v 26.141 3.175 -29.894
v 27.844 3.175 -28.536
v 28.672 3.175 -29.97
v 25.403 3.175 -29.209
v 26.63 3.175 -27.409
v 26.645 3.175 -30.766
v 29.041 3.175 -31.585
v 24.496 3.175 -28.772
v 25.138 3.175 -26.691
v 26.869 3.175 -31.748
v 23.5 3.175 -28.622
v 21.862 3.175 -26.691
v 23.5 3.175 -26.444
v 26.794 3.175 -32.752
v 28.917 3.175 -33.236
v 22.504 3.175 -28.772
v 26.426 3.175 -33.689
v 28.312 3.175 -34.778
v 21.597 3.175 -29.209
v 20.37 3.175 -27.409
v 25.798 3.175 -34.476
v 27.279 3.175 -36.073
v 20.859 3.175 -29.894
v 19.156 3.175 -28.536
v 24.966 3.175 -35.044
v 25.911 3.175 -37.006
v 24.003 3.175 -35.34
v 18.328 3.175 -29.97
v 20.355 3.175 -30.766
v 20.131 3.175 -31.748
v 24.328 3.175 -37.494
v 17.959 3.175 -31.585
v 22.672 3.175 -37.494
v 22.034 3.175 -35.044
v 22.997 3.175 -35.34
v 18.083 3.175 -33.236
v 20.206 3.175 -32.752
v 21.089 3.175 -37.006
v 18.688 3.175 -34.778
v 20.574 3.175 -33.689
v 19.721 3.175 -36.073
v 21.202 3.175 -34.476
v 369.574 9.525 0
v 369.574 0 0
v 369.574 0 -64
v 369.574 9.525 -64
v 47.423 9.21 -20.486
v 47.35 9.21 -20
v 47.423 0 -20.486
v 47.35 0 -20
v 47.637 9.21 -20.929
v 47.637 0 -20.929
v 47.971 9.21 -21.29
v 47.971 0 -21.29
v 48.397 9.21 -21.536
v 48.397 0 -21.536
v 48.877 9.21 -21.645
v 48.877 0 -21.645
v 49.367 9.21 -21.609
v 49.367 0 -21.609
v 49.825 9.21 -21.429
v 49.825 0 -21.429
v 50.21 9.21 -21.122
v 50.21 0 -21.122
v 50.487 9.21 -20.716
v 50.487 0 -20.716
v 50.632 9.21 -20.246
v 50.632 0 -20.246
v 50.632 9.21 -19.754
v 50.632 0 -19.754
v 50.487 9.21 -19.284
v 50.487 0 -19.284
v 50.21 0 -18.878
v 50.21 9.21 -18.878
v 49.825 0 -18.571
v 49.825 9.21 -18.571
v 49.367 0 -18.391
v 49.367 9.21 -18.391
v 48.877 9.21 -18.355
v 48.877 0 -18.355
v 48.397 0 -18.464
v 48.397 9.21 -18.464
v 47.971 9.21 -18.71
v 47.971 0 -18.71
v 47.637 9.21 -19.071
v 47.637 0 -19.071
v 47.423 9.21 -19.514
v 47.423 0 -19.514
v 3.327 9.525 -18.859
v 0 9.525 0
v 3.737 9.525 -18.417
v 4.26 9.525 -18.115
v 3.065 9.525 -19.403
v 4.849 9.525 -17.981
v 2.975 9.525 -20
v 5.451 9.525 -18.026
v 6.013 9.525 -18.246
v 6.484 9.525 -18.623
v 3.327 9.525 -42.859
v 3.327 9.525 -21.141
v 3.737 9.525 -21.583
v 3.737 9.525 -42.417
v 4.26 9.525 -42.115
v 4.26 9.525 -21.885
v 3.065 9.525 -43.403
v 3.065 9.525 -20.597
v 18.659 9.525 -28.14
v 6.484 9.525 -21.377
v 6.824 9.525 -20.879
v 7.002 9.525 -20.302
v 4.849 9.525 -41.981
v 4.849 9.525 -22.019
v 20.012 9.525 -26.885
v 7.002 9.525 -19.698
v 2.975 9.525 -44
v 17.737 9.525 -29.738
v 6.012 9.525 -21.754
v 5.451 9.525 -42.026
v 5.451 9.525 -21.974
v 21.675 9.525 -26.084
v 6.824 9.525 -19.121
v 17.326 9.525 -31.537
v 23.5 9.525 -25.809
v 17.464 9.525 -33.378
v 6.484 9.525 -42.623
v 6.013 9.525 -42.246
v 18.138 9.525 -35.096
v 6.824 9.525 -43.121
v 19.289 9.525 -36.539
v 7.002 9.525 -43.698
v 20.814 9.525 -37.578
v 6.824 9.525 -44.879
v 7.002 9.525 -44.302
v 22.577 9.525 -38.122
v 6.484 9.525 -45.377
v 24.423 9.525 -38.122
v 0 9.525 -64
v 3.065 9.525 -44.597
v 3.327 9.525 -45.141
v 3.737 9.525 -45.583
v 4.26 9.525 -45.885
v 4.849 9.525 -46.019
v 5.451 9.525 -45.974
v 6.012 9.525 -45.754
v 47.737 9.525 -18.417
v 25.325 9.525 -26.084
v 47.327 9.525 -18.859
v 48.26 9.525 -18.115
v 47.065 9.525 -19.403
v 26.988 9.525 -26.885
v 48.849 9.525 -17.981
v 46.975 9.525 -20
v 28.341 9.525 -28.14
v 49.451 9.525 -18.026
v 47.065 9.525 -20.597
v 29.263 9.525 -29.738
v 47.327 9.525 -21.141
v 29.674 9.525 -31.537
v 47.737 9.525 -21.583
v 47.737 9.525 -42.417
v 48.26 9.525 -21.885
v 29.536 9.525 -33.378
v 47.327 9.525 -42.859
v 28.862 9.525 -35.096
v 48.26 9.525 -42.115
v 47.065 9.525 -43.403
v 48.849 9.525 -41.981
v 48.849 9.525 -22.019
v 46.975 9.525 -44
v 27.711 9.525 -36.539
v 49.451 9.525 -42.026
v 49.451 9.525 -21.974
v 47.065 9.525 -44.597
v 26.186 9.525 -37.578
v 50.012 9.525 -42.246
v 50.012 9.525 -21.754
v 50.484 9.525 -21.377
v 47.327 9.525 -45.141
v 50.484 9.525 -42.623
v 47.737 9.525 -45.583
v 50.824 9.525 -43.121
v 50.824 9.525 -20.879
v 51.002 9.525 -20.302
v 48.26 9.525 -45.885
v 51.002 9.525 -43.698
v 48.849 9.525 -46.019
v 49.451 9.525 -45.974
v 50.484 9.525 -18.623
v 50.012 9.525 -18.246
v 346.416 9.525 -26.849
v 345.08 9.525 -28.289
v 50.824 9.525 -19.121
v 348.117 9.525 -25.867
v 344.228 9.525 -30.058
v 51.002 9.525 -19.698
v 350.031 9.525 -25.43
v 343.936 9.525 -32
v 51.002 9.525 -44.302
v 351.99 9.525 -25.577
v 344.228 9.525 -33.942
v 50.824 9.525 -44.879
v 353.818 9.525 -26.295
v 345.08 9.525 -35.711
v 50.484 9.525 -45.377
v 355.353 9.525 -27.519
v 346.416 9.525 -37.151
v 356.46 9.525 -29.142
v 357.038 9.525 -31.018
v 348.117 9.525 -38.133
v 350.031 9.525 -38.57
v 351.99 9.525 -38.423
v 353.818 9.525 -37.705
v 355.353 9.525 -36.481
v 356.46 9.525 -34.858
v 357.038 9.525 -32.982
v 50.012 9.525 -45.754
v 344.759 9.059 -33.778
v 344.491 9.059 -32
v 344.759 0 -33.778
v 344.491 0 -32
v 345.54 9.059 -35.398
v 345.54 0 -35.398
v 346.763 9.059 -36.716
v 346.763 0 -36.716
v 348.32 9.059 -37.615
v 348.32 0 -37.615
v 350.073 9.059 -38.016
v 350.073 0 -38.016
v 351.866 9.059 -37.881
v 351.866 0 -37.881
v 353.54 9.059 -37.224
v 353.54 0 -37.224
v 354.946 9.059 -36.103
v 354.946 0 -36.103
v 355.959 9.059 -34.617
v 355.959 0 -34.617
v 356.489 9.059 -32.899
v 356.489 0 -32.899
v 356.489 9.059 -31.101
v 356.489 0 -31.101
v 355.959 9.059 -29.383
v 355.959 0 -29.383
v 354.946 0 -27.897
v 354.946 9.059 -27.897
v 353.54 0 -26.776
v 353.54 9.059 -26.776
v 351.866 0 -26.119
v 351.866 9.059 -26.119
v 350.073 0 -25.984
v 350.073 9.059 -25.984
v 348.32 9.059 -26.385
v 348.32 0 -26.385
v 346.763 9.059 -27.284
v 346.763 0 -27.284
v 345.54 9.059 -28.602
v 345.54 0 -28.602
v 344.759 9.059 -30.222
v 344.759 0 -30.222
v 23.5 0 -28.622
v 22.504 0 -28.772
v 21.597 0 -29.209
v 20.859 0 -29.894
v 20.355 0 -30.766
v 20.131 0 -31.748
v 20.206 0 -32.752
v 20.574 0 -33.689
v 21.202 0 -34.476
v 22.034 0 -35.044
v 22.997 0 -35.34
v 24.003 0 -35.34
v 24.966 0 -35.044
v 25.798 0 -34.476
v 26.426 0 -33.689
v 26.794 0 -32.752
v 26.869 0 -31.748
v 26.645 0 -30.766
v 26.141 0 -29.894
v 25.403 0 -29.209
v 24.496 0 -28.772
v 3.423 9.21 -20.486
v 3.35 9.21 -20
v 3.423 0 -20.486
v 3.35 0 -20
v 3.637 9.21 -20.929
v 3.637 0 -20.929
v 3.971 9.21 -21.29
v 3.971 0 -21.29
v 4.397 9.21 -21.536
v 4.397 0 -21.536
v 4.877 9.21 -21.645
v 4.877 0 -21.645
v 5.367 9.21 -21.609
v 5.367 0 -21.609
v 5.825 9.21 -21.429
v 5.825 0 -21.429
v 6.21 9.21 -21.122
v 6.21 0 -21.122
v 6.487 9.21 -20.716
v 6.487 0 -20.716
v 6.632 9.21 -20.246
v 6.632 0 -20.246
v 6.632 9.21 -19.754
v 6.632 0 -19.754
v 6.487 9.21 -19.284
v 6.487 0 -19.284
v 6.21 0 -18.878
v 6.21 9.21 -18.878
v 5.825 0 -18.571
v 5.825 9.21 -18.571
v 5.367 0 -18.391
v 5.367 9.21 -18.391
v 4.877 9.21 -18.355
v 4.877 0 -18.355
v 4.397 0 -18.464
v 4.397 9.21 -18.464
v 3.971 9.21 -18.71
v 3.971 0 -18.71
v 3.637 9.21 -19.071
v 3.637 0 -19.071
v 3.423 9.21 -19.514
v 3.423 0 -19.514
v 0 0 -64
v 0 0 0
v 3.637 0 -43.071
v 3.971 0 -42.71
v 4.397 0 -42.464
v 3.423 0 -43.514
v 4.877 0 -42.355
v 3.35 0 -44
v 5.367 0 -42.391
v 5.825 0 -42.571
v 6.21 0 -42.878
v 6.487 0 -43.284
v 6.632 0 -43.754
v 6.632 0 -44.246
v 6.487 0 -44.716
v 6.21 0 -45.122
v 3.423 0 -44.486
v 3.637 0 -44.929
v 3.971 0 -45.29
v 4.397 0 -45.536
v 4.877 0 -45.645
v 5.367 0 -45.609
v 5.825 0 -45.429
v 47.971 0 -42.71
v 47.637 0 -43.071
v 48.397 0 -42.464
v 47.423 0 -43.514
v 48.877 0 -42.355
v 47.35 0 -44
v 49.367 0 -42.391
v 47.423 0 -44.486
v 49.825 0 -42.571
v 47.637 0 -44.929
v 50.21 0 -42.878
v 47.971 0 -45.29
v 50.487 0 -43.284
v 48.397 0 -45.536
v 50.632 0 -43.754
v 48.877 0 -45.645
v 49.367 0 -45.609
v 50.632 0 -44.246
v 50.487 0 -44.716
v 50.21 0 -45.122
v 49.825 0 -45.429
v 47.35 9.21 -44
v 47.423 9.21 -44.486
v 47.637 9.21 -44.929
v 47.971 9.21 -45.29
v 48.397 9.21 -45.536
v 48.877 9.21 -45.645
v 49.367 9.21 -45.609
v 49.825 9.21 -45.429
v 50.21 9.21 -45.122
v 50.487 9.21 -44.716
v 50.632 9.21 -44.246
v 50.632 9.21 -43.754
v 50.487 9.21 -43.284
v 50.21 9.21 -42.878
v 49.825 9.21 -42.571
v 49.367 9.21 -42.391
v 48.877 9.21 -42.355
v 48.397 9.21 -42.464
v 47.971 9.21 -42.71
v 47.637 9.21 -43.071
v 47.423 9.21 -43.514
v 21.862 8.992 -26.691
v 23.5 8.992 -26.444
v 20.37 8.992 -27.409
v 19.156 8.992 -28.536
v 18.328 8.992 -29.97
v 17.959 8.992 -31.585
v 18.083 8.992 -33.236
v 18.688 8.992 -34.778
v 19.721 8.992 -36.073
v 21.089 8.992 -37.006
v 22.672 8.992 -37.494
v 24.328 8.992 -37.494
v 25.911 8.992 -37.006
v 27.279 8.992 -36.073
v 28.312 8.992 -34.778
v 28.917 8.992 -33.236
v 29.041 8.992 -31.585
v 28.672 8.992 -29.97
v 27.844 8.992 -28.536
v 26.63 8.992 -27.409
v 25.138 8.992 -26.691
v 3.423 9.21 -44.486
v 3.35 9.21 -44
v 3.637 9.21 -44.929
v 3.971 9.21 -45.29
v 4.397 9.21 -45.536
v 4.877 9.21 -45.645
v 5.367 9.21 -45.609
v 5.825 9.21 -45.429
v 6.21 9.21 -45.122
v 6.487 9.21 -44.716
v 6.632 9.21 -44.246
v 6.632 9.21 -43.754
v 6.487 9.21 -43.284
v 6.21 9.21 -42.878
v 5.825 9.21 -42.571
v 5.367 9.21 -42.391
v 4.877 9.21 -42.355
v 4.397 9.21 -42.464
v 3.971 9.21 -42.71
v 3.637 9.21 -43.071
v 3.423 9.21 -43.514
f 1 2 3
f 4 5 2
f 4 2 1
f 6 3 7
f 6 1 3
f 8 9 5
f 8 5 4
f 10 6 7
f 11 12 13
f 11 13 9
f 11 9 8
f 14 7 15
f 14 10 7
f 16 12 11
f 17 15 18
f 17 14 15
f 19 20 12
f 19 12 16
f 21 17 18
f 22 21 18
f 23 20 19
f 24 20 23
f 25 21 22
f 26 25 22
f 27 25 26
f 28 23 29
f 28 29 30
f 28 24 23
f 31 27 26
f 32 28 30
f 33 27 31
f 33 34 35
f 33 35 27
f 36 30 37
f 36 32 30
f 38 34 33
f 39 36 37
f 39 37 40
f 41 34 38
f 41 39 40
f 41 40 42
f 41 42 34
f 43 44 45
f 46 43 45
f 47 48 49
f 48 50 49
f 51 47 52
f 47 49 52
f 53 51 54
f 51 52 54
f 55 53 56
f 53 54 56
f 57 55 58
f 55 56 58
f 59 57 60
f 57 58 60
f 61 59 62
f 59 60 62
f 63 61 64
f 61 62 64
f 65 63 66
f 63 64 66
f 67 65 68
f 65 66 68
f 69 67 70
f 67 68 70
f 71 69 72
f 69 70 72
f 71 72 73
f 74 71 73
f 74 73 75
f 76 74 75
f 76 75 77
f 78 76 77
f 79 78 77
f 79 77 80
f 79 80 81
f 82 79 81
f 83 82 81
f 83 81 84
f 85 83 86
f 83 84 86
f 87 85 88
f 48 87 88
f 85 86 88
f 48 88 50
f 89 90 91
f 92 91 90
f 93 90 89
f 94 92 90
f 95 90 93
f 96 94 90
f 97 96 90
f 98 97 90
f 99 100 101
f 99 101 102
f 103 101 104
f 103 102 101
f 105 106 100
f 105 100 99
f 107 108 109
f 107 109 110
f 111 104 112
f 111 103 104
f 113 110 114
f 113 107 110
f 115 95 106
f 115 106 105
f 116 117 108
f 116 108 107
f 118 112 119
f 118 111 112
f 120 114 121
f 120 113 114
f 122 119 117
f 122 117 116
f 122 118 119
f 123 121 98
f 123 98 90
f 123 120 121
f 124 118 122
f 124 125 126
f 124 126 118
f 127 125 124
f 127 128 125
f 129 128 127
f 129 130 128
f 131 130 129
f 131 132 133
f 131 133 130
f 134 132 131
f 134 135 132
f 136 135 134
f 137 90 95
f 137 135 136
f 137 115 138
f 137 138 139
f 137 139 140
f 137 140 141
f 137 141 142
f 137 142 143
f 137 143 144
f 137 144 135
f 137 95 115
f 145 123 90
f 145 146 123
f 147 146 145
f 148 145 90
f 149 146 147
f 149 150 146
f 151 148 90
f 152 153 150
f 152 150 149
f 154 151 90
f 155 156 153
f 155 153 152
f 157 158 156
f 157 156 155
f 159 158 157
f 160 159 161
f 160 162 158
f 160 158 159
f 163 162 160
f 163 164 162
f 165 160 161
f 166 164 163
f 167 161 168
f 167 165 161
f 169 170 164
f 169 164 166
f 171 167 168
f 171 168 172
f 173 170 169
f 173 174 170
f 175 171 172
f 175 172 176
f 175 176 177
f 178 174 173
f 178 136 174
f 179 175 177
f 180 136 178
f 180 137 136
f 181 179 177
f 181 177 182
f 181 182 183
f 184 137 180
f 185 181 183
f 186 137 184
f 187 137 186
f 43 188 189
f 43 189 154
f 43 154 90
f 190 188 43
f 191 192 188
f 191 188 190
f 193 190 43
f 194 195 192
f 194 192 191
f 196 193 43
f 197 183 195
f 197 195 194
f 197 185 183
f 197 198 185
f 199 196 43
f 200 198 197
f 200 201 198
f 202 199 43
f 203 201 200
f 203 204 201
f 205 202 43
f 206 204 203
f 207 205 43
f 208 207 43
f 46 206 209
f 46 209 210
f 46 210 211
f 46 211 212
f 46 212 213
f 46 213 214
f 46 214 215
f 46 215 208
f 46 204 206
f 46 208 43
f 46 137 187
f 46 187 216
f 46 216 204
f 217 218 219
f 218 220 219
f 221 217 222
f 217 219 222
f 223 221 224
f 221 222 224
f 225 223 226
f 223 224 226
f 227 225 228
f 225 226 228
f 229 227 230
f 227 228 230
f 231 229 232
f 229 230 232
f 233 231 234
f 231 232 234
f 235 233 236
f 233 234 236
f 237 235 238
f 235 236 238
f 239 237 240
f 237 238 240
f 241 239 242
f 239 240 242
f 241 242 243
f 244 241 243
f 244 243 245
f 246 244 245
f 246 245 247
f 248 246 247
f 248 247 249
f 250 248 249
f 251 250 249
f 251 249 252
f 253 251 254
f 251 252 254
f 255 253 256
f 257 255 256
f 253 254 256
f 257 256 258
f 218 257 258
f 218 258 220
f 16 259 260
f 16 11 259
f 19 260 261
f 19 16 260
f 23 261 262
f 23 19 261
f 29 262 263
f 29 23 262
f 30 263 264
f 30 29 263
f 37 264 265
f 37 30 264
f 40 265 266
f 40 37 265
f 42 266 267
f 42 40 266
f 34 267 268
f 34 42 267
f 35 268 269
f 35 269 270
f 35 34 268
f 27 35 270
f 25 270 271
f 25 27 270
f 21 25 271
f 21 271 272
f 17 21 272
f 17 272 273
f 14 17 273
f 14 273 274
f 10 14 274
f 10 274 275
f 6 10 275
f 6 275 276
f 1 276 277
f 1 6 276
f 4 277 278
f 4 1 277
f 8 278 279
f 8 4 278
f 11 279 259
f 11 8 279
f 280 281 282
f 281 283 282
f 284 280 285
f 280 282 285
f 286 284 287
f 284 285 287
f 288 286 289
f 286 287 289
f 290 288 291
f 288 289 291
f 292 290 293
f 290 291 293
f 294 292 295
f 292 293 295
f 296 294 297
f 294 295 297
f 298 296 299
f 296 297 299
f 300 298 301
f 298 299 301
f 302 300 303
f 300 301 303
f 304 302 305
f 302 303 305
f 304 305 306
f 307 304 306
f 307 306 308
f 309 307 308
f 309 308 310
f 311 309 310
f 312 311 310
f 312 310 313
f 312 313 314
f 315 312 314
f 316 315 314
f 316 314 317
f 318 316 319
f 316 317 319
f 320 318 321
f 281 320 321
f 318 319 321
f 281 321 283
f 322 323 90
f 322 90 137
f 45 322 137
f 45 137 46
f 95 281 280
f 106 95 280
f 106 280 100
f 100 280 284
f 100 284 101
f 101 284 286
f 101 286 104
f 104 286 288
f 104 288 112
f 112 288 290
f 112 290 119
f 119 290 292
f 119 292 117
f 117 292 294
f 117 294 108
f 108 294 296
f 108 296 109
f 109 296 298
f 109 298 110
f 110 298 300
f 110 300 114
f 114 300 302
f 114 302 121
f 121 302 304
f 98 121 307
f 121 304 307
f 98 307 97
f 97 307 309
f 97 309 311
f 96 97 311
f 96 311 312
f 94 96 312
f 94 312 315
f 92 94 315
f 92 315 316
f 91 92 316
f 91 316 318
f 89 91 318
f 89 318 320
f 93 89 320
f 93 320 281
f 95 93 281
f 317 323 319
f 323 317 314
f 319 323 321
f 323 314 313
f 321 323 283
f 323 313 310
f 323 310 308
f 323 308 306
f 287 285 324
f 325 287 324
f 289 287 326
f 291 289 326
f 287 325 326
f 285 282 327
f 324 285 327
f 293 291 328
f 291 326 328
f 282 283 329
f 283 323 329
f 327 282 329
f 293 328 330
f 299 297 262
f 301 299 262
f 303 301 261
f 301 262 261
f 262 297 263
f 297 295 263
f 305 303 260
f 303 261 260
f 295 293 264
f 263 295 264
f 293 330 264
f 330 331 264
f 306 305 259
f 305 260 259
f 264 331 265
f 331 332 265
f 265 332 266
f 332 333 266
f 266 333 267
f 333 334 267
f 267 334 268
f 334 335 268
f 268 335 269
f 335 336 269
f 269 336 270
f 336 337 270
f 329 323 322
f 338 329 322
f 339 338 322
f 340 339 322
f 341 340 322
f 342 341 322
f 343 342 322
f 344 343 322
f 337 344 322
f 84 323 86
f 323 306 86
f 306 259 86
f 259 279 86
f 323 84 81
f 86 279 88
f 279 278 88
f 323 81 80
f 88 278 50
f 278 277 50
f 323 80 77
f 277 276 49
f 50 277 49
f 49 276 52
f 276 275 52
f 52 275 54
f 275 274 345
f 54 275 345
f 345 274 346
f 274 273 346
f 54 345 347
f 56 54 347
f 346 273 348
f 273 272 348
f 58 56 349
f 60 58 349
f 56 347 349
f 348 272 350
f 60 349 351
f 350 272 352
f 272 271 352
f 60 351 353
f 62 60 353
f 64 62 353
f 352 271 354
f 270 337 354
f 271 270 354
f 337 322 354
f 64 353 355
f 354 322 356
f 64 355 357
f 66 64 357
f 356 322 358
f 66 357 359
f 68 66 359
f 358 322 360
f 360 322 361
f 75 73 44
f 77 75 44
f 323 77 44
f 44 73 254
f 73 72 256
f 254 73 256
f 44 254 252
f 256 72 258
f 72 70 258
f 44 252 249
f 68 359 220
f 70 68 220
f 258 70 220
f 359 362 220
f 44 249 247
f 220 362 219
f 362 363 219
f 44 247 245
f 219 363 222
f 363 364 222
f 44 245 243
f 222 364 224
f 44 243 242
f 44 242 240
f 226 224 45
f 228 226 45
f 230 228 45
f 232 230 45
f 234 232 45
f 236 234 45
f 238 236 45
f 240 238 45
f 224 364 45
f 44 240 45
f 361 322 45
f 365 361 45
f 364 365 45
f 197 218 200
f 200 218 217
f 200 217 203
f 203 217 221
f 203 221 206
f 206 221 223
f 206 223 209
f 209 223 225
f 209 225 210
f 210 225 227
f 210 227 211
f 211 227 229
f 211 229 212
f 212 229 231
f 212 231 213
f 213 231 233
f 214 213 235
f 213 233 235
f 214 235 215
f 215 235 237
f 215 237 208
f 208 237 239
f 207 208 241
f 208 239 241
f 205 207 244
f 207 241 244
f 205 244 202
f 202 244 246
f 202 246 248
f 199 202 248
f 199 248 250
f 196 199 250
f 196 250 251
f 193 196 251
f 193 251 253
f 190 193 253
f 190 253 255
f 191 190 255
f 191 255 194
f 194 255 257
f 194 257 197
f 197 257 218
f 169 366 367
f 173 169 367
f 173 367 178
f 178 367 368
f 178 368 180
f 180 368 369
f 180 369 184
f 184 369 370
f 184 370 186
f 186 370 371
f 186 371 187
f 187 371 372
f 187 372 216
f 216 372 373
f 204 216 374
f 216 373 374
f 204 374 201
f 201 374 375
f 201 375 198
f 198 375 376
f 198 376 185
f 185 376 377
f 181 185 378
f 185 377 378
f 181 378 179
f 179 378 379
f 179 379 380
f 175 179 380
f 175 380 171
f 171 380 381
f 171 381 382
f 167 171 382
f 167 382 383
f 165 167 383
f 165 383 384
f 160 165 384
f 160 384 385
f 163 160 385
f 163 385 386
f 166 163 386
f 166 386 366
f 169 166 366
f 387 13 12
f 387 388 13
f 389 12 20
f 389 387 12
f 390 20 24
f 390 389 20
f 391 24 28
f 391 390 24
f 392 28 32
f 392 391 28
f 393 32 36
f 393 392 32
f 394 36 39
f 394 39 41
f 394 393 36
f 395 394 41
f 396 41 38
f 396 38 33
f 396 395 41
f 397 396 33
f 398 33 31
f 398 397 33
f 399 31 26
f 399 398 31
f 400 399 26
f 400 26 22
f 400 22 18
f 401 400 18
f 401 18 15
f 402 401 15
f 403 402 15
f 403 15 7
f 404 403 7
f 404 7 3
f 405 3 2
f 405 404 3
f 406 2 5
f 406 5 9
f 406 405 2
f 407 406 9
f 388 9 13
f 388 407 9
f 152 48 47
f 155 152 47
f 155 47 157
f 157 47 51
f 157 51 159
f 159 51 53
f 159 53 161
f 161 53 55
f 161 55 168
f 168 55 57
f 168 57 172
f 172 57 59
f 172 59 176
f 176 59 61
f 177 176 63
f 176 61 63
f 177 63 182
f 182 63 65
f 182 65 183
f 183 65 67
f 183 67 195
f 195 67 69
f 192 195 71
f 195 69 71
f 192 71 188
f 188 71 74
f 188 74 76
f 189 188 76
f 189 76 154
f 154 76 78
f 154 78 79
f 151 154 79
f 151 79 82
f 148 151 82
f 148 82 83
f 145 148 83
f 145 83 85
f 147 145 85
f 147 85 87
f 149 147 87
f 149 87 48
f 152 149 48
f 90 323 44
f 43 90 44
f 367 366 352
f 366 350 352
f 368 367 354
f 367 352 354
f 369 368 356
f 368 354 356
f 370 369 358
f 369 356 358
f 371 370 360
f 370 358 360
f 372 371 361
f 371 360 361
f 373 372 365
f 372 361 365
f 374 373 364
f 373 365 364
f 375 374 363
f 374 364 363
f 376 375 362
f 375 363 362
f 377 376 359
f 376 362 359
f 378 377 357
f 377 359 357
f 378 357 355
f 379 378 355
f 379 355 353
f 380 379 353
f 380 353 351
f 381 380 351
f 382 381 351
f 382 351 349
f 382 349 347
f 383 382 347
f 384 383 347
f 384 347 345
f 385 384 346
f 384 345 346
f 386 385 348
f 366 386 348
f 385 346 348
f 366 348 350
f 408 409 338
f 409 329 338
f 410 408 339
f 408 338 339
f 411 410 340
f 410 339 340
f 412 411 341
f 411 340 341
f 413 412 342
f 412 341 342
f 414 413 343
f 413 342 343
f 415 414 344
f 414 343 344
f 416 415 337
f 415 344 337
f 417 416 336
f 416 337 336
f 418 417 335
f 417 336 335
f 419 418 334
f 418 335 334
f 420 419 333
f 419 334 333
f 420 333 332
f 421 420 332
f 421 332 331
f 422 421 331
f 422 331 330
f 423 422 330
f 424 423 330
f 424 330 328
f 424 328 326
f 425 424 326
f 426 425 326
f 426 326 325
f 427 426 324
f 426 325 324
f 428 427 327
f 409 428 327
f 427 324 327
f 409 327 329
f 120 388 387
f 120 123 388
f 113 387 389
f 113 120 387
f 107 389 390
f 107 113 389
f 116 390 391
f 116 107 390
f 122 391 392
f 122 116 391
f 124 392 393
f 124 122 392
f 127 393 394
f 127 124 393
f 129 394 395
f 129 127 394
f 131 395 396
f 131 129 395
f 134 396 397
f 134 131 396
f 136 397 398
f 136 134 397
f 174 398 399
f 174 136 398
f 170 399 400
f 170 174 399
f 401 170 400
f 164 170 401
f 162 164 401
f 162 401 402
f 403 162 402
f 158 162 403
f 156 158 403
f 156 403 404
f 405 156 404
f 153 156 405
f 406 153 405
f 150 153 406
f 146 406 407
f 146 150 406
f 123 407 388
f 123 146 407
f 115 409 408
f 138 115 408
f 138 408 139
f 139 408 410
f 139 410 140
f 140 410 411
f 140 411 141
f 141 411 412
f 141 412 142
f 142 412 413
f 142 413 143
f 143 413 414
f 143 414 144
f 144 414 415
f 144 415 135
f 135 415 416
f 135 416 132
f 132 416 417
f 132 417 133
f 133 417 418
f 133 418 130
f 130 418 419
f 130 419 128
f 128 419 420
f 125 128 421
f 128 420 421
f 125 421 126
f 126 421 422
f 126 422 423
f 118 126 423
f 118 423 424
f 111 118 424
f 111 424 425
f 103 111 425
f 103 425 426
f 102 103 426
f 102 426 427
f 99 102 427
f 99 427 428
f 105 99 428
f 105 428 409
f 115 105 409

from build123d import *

# Parameters (mm, degrees)
SKETCH1_W                                = 369.57380619
SKETCH1_H                                = 64
BOSS_EXTRUDE1_DEPTH                      = 9.525
F_15_32_0_475_DIAMETER_HOLE1_D           = 12.065
F_15_32_0_475_DIAMETER_HOLE1_DEPTH       = 10.1092
F_15_32_0_475_DIAMETER_HOLE1_CSINK_D     = 13.17625
F_15_32_0_475_DIAMETER_HOLE1_CSINK_ANGLE = 100
F_15_32_0_475_DIAMETER_HOLE1_TIP         = 3.624691684
M4X0_7_TAPPED_HOLE1_D                    = 3.3
M4X0_7_TAPPED_HOLE1_CSINK_D              = 4.05
M4X0_7_TAPPED_HOLE1_CSINK_ANGLE          = 100


with BuildPart() as part:
    # Sketch1 → Boss-Extrude1 (new body)
    with BuildSketch(Plane(origin=(0, 0, 0), x_dir=(1, 0, 0), z_dir=(0, 1, 0))):
        with Locations((184.786903095, 32)):
            Rectangle(SKETCH1_W, SKETCH1_H)
    extrude(amount=BOSS_EXTRUDE1_DEPTH)

    # 15/32 (0.475) Diameter Hole1
    with Locations(Plane(origin=(0, 9.525, 0), x_dir=(1, 0, 0), z_dir=(0, 1, 0))):
        with Locations((350.52380619, 32)):
            CounterSinkHole(F_15_32_0_475_DIAMETER_HOLE1_D / 2, F_15_32_0_475_DIAMETER_HOLE1_CSINK_D / 2, depth=F_15_32_0_475_DIAMETER_HOLE1_DEPTH, counter_sink_angle=F_15_32_0_475_DIAMETER_HOLE1_CSINK_ANGLE)
            with Locations((0, 0, -(F_15_32_0_475_DIAMETER_HOLE1_DEPTH + F_15_32_0_475_DIAMETER_HOLE1_TIP / 2))):  # 118° drill point
                Cone(0, F_15_32_0_475_DIAMETER_HOLE1_D / 2, F_15_32_0_475_DIAMETER_HOLE1_TIP, mode=Mode.SUBTRACT)

    # M4x0.7 Tapped Hole1 (through all)
    with Locations(Plane(origin=(0, 9.525, 0), x_dir=(1, 0, 0), z_dir=(0, 1, 0))):
        with Locations((49, 44), (49, 20), (5, 44), (5, 20)):
            CounterSinkHole(M4X0_7_TAPPED_HOLE1_D / 2, M4X0_7_TAPPED_HOLE1_CSINK_D / 2, counter_sink_angle=M4X0_7_TAPPED_HOLE1_CSINK_ANGLE)

    # Sketch11 → CBORE for 1/4 Socket Head Cap Screw1 (revolve, cut)
    with BuildSketch(Plane(origin=(23.5, 9.525, -32), x_dir=(0, 0, 1), z_dir=(1, 0, 0))):
        Polygon((0, 0), (0, 9.525), (3.3782, 9.525), (3.3782, 6.35), (5.55625, 6.35), (5.55625, 0.532828266), (6.19125, 0), align=None)
    revolve(axis=Axis((23.5, 15.875, -32), (0, -1, 0)), mode=Mode.SUBTRACT)


solid = part.part
